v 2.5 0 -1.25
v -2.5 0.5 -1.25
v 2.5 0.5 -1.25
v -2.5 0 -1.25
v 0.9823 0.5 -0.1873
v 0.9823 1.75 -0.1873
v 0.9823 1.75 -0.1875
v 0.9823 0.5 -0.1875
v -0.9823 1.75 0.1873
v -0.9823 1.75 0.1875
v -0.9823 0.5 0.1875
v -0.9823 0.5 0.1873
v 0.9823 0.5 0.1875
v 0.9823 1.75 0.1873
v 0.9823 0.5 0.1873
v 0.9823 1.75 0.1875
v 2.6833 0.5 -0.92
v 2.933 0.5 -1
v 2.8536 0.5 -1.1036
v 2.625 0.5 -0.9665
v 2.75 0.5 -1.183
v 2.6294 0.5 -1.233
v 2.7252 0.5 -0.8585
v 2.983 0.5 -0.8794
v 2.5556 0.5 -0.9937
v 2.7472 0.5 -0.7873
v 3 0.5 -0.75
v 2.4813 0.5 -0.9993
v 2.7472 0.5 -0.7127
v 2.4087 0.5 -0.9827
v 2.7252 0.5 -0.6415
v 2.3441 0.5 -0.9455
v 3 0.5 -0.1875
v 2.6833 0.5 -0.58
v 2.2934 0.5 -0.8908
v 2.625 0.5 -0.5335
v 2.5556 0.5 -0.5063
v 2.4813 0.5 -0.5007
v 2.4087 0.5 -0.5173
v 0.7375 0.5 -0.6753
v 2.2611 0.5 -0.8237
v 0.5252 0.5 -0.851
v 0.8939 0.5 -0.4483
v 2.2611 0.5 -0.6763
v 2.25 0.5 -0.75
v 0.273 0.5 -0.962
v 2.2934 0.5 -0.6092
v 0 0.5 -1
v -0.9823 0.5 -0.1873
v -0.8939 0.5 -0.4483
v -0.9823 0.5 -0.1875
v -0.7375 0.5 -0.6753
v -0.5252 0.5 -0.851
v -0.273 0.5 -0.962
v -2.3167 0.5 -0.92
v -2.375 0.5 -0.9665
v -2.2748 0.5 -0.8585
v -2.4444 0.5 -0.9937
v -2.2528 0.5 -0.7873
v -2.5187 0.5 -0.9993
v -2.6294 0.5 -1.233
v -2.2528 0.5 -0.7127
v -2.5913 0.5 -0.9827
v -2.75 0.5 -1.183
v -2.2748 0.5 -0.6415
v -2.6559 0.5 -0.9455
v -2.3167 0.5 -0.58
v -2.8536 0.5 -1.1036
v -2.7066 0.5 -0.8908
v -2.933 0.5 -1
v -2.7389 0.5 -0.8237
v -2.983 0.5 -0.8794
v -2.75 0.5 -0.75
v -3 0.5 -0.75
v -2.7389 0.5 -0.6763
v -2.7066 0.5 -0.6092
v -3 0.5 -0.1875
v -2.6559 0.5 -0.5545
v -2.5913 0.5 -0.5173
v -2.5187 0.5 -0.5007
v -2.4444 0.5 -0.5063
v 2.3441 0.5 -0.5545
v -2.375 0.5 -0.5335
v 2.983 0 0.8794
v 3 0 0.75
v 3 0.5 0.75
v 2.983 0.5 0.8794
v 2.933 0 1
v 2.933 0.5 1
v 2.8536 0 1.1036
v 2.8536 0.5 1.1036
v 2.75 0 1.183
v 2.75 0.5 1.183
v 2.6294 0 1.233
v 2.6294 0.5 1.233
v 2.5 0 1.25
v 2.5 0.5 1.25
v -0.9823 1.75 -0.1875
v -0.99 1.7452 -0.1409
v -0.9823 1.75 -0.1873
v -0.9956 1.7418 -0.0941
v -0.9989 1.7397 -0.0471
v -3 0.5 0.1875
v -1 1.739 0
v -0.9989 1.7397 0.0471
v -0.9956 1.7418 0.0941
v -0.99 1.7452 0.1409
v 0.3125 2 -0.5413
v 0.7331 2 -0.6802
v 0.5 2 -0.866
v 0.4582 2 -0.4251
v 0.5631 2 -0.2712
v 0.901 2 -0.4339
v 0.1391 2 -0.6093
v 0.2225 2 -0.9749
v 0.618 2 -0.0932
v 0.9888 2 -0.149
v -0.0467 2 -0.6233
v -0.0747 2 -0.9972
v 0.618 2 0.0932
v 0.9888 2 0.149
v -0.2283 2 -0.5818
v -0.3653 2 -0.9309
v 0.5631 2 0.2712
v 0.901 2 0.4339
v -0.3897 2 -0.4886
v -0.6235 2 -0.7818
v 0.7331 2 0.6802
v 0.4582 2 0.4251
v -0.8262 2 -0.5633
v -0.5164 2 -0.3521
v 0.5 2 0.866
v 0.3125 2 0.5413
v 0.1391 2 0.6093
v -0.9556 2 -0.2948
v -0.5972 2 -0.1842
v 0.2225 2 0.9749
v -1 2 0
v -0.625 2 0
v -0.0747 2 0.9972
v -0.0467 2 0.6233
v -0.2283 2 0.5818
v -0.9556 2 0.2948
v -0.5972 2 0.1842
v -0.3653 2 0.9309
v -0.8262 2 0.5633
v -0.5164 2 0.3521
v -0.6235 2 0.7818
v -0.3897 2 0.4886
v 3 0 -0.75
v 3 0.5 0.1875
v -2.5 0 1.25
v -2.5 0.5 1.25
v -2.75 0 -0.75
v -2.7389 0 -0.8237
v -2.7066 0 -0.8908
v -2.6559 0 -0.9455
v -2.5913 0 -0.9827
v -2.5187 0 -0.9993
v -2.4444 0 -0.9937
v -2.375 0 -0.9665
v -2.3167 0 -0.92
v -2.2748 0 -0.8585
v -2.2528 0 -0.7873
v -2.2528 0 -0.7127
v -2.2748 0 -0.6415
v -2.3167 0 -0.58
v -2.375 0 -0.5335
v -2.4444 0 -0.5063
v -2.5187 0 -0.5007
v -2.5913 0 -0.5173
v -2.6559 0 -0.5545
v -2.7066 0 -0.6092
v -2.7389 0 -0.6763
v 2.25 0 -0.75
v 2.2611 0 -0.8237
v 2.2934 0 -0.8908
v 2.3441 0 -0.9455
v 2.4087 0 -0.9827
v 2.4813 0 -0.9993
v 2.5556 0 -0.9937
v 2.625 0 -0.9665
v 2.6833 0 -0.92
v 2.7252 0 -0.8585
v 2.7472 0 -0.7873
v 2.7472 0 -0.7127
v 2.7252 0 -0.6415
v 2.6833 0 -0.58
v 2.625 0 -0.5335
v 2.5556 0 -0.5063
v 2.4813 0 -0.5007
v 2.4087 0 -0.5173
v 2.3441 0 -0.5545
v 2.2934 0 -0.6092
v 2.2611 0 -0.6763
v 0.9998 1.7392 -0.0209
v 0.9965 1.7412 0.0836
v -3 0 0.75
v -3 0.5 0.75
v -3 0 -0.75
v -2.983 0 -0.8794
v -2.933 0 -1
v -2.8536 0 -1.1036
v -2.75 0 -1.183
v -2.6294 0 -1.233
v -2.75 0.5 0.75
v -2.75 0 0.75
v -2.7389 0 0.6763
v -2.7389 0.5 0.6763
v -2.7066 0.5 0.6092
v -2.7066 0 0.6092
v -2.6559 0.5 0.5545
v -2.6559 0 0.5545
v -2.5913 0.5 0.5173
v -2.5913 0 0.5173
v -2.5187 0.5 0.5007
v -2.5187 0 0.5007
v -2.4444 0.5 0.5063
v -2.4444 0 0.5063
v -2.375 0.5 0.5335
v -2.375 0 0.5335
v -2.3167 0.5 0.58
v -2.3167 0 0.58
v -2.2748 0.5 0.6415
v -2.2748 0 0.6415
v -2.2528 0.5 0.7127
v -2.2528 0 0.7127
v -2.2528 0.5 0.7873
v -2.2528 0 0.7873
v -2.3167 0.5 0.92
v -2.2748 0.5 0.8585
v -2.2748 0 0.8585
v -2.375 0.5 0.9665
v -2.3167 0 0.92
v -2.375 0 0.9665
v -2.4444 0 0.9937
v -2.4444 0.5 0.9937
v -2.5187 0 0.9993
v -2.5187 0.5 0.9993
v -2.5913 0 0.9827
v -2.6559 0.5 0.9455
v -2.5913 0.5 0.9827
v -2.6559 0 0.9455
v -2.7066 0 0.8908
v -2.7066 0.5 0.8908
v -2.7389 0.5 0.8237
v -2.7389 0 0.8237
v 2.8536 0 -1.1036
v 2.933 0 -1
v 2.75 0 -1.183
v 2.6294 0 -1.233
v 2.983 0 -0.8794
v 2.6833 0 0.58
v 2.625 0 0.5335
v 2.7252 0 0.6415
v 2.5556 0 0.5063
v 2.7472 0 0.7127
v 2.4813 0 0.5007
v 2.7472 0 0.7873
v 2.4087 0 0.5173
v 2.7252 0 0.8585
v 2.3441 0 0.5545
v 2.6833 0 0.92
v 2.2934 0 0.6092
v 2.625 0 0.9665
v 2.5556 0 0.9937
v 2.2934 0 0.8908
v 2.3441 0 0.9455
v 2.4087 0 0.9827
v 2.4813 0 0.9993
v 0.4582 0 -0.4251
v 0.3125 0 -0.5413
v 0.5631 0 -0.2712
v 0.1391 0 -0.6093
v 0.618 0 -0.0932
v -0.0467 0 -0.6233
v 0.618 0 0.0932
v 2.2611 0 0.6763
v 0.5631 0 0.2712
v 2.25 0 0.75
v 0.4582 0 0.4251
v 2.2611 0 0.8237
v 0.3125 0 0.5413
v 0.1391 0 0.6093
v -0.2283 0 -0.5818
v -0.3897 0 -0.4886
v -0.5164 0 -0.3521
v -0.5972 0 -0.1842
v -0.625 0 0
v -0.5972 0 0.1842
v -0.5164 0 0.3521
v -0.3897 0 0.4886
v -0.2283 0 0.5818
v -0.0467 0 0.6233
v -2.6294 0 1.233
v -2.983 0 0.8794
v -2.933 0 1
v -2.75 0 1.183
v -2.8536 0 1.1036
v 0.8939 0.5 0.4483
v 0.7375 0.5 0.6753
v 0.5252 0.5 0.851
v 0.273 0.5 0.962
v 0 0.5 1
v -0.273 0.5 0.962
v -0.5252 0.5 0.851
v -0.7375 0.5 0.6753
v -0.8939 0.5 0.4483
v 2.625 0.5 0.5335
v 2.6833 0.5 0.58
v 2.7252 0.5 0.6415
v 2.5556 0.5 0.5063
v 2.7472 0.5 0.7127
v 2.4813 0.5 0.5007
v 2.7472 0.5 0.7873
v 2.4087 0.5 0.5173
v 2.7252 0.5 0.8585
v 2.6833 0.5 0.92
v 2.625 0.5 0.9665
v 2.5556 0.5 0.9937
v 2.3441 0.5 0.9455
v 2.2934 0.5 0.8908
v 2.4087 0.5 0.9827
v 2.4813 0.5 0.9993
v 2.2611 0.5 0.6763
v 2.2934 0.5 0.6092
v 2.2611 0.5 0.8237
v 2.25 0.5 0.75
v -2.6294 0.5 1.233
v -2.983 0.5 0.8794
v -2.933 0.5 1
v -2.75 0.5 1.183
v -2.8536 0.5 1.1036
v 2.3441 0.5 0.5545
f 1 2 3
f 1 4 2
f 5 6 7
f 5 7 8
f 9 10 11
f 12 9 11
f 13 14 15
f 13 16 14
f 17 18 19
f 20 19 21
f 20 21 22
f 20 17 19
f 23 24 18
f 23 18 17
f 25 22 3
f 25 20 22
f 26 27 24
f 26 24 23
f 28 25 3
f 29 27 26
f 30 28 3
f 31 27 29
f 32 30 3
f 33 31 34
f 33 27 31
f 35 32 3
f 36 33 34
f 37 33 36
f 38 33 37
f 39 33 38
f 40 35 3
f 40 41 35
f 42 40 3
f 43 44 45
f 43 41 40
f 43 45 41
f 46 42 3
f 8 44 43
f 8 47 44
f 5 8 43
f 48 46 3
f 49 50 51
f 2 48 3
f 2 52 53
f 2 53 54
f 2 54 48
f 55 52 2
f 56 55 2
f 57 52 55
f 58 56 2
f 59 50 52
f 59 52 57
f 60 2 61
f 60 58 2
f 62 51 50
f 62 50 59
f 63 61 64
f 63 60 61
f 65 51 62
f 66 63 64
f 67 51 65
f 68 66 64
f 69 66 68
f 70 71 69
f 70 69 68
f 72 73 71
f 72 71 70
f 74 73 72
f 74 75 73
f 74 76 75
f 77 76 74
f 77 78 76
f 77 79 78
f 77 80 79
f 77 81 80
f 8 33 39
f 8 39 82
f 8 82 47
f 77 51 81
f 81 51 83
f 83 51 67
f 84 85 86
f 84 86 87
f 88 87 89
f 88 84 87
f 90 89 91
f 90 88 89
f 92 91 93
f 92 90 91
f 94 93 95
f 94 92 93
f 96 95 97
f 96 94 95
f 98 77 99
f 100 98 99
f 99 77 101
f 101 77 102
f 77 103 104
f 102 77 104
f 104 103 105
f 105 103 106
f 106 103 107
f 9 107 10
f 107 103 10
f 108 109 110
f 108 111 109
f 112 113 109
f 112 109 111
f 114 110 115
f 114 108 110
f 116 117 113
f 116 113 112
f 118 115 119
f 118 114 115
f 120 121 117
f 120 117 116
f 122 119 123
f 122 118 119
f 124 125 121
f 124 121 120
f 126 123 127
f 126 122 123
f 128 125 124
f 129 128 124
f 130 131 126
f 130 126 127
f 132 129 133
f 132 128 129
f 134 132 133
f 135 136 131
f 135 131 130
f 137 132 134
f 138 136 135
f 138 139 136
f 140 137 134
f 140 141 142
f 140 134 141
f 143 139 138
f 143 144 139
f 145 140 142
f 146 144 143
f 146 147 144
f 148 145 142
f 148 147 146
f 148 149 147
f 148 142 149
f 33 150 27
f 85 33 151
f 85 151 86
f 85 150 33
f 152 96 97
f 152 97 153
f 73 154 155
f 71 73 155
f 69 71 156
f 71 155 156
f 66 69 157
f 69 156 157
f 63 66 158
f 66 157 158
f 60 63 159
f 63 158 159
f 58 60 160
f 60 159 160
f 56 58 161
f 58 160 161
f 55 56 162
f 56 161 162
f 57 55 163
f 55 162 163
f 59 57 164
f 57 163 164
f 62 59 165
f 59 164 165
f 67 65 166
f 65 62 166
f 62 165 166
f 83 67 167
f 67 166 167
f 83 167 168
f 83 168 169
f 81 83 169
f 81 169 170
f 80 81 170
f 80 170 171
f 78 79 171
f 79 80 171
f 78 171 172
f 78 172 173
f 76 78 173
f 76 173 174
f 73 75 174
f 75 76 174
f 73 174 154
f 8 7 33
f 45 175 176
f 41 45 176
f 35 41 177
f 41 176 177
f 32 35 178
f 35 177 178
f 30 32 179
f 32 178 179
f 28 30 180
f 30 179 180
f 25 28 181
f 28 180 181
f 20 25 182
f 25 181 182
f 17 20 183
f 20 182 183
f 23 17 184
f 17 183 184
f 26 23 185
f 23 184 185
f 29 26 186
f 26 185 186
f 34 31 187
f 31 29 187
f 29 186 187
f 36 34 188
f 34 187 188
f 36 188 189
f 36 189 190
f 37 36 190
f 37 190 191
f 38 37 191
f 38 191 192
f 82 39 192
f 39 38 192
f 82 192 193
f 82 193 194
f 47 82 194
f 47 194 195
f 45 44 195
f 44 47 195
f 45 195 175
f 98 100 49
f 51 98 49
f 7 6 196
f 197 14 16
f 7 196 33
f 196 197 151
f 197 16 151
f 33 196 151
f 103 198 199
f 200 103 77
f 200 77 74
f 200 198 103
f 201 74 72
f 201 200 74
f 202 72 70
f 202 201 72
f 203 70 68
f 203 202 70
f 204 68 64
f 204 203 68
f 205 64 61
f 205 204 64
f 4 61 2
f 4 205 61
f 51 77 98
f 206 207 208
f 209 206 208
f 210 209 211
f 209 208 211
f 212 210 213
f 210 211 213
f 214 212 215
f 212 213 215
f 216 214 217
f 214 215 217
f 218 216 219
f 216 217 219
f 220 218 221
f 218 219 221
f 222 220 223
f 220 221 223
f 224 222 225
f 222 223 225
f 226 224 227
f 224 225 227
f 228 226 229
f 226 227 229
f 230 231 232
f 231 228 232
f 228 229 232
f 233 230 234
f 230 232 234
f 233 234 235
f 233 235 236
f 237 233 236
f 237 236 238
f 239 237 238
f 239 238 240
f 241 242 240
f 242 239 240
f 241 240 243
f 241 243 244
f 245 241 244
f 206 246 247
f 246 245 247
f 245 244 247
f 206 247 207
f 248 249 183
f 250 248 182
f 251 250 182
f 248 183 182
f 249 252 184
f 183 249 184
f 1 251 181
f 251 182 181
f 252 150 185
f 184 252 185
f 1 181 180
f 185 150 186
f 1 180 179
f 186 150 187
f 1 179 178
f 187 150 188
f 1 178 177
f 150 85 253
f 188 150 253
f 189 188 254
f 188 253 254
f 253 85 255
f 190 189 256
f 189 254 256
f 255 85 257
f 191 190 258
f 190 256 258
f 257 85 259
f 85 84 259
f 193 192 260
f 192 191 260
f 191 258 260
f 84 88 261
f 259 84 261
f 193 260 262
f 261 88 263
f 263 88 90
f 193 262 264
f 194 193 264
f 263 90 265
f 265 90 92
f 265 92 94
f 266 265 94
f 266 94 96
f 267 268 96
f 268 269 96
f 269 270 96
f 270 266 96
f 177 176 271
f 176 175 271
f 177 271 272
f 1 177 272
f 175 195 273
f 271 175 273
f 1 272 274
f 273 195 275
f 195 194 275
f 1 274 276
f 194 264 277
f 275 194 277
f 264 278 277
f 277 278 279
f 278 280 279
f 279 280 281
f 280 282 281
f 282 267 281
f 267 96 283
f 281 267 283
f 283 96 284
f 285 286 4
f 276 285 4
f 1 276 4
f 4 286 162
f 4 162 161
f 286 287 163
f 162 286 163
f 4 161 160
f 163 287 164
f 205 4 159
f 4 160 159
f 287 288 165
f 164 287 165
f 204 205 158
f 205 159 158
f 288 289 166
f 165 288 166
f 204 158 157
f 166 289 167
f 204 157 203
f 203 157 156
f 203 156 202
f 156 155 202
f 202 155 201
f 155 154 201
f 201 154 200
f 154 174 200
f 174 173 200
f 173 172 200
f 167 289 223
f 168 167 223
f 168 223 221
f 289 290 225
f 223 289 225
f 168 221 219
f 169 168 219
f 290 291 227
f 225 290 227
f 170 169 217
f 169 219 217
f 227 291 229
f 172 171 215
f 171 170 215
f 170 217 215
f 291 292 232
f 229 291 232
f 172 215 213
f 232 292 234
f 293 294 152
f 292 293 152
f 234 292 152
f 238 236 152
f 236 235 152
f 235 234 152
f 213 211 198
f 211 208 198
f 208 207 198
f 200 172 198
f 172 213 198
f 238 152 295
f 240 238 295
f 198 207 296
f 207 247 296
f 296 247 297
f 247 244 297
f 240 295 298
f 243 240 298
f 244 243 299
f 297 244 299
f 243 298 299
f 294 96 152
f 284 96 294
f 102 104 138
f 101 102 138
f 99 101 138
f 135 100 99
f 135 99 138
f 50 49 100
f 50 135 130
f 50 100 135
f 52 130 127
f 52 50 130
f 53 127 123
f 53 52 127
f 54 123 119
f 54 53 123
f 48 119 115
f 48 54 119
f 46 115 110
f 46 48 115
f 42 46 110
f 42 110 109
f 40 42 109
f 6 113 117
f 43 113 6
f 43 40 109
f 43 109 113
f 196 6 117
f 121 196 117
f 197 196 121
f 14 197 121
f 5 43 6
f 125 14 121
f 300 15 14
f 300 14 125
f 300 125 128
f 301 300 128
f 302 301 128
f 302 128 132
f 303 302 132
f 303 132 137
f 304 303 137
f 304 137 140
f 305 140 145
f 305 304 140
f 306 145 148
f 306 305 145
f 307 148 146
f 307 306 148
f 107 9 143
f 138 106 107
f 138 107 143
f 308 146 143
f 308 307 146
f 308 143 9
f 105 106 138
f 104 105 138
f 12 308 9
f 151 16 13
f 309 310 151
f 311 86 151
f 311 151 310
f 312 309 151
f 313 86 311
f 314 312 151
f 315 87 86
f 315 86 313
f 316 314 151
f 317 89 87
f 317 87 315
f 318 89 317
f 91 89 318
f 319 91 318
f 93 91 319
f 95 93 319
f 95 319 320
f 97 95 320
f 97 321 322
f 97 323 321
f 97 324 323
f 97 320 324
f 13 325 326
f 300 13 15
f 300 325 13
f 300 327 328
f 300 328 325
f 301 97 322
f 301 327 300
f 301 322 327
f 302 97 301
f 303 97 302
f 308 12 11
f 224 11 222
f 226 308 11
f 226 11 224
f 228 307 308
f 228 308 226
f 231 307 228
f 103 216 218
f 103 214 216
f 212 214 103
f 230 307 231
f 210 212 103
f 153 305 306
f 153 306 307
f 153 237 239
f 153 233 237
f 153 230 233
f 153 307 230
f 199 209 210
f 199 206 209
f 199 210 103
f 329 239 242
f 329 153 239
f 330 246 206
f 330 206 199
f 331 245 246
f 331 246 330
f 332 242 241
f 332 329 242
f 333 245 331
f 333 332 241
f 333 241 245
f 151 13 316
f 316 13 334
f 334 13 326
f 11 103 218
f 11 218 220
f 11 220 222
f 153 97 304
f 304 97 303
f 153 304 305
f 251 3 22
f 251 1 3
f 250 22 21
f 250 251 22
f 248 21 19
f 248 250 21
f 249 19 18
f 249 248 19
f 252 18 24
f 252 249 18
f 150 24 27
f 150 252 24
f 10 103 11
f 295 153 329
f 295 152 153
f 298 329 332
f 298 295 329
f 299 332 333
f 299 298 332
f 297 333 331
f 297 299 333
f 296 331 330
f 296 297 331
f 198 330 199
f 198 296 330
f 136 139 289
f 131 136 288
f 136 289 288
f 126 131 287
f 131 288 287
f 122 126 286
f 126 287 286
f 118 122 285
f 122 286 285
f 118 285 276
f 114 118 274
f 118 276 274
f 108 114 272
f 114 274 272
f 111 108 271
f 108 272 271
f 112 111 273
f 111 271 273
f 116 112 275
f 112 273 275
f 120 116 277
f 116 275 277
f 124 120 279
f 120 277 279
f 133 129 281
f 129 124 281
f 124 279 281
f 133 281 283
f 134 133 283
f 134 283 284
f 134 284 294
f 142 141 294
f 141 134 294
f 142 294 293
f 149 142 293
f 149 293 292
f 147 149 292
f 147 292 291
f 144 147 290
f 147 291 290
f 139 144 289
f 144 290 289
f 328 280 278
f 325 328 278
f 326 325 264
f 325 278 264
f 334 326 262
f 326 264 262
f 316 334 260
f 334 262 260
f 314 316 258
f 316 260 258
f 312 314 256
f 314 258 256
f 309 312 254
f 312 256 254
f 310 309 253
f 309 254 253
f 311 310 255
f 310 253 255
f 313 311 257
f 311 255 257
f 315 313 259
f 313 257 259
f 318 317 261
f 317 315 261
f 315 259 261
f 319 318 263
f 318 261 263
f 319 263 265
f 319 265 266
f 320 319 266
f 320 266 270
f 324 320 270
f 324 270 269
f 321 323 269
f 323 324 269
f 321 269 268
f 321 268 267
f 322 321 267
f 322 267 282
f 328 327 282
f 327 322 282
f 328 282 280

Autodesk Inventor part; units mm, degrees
ref_plane "YZ Plane" through (0, 0, 0) normal (1, 0, 0) x (0, 1, 0)
ref_plane "XZ Plane" through (0, 0, 0) normal (0, 1, 0) x (-1, 0, 0)
sketch "Sketch1" plane through (0, 0, 0) normal (0, 1, 0) x (-1, 0, 0)
  line L0 (2.5, -1.25) -> (-2.5, -1.25)
  line L1 (-3, -0.75) -> (-3, 0.75)
  line L2 (-2.5, 1.25) -> (2.5, 1.25)
  line L3 (3, 0.75) -> (3, -0.75)
  arc A0 (2.5, -1.25) -> (3, -0.75) centre (2.5, -0.75) ccw
  arc A1 (-3, -0.75) -> (-2.5, -1.25) centre (-2.5, -0.75) ccw
  arc A2 (-2.5, 1.25) -> (-3, 0.75) centre (-2.5, 0.75) ccw
  arc A3 (3, 0.75) -> (2.5, 1.25) centre (2.5, 0.75) ccw
  circle A4 centre (2.5, -0.75) radius 0.25
  circle A5 centre (-2.5, -0.75) radius 0.25
  circle A6 centre (-2.5, 0.75) radius 0.25
  circle A7 centre (2.5, 0.75) radius 0.25
  circle A8 centre (0, 0) radius 1
  circle A9 centre (0, 0) radius 0.625
  line L4 (0, -1.895) -> (0, 1.895) projected
  line L5 (4.345, 0) -> (-4.345, 0) projected
  line L6 (3, -0.1875) -> (0.9823, -0.1875)
  line L7 (3, 0.1875) -> (0.9823, 0.1875)
  line L8 (-3, -0.1875) -> (-0.9823, -0.1875)
  line L9 (-3, 0.1875) -> (-0.9823, 0.1875)
  point P0 (-2.5, 0.75)
  dimension "d9" = 2
  dimension "d0" = 0.75
  dimension "d1" = 0.75
  dimension "d2" = 2.5
  dimension "d3" = 2.5
  dimension "d4" = 0.5
  dimension "d5" = 0.5
  dimension "d6" = 0.5
  dimension "d7" = 0.5
  dimension "d8" = 0.5
  dimension "d10" = 1.25
  dimension "d11" = 0.375
extrude "Extrusion1" add sketch "Sketch1" along normal blind 0.5 contours L0 L4 A8 L6 L3 A0 | L0 A1 L1 L8 A8 L4 | L6 A8 L5 L3 | L8 L1 L5 A8 | L5 A8 L7 L3 | L5 L1 L9 A8 | L7 A8 L4 L2 A3 L3 | L9 L1 A2 L2 L4 A8
extrude "Extrusion2" add sketch "Sketch1" along normal blind 2 contours L4 A9 L5 A8 | A8 L5 A9 L4 | A8 L4 A9 L5 | L5 A9 L4 A8
sketch "Sketch2" plane through (0, 0.5, 0) normal (0, 1, 0) x (1, 0, 0)
  circle A0 centre (0, 0) radius 1 projected
  line L0 (3, -0.75) -> (3, 0.75) projected
  line L1 (-3, 0.75) -> (-3, -0.75) projected
  line L2 (-3, 0.1875) -> (-0.9823, 0.1875) projected
  line L3 (-3, -0.1875) -> (-0.9823, -0.1875) projected
  line L4 (3, -0.1875) -> (0.9823, -0.1875) projected
  line L5 (3, 0.1875) -> (0.9823, 0.1875) projected
ref_plane "Work Plane1" through (-3, 0.5, 0.1875) normal (0, 0, 1) x (1, 0, 0)
sketch "Sketch3" plane through (-3, 0.5, 0.1875) normal (0, 0, 1) x (1, 0, 0)
  line L0 (0, -0.5) -> (0, 0) projected
  line L1 (2.0177, 1.25) -> (2.0177, 0) projected
  line L2 (0, 0) -> (2.0177, 1.25)
  line L3 (4, 1.25) -> (3.9823, 1.25) projected
  line L4 (6, -0.5) -> (6, 0) projected
  line L5 (3.9823, 1.25) -> (6, 0)
  line L6 (0, 0) -> (2.0177, 0)
  line L7 (2.0177, 1.25) -> (2.0177, 0)
  line L8 (3.9823, 1.25) -> (3.9823, 0) projected
  line L9 (6, 0) -> (3.9823, 0) projected
  line L10 (3.9823, 1.25) -> (3.9823, 0)
  line L11 (6, 0) -> (6, 1.25) projected
  line L12 (3.9823, 0) -> (6, 0)
  point P0 (3, -0.5)
extrude "Extrusion4" add sketch "Sketch3" against normal blind 0.375
properties part number "7b"
